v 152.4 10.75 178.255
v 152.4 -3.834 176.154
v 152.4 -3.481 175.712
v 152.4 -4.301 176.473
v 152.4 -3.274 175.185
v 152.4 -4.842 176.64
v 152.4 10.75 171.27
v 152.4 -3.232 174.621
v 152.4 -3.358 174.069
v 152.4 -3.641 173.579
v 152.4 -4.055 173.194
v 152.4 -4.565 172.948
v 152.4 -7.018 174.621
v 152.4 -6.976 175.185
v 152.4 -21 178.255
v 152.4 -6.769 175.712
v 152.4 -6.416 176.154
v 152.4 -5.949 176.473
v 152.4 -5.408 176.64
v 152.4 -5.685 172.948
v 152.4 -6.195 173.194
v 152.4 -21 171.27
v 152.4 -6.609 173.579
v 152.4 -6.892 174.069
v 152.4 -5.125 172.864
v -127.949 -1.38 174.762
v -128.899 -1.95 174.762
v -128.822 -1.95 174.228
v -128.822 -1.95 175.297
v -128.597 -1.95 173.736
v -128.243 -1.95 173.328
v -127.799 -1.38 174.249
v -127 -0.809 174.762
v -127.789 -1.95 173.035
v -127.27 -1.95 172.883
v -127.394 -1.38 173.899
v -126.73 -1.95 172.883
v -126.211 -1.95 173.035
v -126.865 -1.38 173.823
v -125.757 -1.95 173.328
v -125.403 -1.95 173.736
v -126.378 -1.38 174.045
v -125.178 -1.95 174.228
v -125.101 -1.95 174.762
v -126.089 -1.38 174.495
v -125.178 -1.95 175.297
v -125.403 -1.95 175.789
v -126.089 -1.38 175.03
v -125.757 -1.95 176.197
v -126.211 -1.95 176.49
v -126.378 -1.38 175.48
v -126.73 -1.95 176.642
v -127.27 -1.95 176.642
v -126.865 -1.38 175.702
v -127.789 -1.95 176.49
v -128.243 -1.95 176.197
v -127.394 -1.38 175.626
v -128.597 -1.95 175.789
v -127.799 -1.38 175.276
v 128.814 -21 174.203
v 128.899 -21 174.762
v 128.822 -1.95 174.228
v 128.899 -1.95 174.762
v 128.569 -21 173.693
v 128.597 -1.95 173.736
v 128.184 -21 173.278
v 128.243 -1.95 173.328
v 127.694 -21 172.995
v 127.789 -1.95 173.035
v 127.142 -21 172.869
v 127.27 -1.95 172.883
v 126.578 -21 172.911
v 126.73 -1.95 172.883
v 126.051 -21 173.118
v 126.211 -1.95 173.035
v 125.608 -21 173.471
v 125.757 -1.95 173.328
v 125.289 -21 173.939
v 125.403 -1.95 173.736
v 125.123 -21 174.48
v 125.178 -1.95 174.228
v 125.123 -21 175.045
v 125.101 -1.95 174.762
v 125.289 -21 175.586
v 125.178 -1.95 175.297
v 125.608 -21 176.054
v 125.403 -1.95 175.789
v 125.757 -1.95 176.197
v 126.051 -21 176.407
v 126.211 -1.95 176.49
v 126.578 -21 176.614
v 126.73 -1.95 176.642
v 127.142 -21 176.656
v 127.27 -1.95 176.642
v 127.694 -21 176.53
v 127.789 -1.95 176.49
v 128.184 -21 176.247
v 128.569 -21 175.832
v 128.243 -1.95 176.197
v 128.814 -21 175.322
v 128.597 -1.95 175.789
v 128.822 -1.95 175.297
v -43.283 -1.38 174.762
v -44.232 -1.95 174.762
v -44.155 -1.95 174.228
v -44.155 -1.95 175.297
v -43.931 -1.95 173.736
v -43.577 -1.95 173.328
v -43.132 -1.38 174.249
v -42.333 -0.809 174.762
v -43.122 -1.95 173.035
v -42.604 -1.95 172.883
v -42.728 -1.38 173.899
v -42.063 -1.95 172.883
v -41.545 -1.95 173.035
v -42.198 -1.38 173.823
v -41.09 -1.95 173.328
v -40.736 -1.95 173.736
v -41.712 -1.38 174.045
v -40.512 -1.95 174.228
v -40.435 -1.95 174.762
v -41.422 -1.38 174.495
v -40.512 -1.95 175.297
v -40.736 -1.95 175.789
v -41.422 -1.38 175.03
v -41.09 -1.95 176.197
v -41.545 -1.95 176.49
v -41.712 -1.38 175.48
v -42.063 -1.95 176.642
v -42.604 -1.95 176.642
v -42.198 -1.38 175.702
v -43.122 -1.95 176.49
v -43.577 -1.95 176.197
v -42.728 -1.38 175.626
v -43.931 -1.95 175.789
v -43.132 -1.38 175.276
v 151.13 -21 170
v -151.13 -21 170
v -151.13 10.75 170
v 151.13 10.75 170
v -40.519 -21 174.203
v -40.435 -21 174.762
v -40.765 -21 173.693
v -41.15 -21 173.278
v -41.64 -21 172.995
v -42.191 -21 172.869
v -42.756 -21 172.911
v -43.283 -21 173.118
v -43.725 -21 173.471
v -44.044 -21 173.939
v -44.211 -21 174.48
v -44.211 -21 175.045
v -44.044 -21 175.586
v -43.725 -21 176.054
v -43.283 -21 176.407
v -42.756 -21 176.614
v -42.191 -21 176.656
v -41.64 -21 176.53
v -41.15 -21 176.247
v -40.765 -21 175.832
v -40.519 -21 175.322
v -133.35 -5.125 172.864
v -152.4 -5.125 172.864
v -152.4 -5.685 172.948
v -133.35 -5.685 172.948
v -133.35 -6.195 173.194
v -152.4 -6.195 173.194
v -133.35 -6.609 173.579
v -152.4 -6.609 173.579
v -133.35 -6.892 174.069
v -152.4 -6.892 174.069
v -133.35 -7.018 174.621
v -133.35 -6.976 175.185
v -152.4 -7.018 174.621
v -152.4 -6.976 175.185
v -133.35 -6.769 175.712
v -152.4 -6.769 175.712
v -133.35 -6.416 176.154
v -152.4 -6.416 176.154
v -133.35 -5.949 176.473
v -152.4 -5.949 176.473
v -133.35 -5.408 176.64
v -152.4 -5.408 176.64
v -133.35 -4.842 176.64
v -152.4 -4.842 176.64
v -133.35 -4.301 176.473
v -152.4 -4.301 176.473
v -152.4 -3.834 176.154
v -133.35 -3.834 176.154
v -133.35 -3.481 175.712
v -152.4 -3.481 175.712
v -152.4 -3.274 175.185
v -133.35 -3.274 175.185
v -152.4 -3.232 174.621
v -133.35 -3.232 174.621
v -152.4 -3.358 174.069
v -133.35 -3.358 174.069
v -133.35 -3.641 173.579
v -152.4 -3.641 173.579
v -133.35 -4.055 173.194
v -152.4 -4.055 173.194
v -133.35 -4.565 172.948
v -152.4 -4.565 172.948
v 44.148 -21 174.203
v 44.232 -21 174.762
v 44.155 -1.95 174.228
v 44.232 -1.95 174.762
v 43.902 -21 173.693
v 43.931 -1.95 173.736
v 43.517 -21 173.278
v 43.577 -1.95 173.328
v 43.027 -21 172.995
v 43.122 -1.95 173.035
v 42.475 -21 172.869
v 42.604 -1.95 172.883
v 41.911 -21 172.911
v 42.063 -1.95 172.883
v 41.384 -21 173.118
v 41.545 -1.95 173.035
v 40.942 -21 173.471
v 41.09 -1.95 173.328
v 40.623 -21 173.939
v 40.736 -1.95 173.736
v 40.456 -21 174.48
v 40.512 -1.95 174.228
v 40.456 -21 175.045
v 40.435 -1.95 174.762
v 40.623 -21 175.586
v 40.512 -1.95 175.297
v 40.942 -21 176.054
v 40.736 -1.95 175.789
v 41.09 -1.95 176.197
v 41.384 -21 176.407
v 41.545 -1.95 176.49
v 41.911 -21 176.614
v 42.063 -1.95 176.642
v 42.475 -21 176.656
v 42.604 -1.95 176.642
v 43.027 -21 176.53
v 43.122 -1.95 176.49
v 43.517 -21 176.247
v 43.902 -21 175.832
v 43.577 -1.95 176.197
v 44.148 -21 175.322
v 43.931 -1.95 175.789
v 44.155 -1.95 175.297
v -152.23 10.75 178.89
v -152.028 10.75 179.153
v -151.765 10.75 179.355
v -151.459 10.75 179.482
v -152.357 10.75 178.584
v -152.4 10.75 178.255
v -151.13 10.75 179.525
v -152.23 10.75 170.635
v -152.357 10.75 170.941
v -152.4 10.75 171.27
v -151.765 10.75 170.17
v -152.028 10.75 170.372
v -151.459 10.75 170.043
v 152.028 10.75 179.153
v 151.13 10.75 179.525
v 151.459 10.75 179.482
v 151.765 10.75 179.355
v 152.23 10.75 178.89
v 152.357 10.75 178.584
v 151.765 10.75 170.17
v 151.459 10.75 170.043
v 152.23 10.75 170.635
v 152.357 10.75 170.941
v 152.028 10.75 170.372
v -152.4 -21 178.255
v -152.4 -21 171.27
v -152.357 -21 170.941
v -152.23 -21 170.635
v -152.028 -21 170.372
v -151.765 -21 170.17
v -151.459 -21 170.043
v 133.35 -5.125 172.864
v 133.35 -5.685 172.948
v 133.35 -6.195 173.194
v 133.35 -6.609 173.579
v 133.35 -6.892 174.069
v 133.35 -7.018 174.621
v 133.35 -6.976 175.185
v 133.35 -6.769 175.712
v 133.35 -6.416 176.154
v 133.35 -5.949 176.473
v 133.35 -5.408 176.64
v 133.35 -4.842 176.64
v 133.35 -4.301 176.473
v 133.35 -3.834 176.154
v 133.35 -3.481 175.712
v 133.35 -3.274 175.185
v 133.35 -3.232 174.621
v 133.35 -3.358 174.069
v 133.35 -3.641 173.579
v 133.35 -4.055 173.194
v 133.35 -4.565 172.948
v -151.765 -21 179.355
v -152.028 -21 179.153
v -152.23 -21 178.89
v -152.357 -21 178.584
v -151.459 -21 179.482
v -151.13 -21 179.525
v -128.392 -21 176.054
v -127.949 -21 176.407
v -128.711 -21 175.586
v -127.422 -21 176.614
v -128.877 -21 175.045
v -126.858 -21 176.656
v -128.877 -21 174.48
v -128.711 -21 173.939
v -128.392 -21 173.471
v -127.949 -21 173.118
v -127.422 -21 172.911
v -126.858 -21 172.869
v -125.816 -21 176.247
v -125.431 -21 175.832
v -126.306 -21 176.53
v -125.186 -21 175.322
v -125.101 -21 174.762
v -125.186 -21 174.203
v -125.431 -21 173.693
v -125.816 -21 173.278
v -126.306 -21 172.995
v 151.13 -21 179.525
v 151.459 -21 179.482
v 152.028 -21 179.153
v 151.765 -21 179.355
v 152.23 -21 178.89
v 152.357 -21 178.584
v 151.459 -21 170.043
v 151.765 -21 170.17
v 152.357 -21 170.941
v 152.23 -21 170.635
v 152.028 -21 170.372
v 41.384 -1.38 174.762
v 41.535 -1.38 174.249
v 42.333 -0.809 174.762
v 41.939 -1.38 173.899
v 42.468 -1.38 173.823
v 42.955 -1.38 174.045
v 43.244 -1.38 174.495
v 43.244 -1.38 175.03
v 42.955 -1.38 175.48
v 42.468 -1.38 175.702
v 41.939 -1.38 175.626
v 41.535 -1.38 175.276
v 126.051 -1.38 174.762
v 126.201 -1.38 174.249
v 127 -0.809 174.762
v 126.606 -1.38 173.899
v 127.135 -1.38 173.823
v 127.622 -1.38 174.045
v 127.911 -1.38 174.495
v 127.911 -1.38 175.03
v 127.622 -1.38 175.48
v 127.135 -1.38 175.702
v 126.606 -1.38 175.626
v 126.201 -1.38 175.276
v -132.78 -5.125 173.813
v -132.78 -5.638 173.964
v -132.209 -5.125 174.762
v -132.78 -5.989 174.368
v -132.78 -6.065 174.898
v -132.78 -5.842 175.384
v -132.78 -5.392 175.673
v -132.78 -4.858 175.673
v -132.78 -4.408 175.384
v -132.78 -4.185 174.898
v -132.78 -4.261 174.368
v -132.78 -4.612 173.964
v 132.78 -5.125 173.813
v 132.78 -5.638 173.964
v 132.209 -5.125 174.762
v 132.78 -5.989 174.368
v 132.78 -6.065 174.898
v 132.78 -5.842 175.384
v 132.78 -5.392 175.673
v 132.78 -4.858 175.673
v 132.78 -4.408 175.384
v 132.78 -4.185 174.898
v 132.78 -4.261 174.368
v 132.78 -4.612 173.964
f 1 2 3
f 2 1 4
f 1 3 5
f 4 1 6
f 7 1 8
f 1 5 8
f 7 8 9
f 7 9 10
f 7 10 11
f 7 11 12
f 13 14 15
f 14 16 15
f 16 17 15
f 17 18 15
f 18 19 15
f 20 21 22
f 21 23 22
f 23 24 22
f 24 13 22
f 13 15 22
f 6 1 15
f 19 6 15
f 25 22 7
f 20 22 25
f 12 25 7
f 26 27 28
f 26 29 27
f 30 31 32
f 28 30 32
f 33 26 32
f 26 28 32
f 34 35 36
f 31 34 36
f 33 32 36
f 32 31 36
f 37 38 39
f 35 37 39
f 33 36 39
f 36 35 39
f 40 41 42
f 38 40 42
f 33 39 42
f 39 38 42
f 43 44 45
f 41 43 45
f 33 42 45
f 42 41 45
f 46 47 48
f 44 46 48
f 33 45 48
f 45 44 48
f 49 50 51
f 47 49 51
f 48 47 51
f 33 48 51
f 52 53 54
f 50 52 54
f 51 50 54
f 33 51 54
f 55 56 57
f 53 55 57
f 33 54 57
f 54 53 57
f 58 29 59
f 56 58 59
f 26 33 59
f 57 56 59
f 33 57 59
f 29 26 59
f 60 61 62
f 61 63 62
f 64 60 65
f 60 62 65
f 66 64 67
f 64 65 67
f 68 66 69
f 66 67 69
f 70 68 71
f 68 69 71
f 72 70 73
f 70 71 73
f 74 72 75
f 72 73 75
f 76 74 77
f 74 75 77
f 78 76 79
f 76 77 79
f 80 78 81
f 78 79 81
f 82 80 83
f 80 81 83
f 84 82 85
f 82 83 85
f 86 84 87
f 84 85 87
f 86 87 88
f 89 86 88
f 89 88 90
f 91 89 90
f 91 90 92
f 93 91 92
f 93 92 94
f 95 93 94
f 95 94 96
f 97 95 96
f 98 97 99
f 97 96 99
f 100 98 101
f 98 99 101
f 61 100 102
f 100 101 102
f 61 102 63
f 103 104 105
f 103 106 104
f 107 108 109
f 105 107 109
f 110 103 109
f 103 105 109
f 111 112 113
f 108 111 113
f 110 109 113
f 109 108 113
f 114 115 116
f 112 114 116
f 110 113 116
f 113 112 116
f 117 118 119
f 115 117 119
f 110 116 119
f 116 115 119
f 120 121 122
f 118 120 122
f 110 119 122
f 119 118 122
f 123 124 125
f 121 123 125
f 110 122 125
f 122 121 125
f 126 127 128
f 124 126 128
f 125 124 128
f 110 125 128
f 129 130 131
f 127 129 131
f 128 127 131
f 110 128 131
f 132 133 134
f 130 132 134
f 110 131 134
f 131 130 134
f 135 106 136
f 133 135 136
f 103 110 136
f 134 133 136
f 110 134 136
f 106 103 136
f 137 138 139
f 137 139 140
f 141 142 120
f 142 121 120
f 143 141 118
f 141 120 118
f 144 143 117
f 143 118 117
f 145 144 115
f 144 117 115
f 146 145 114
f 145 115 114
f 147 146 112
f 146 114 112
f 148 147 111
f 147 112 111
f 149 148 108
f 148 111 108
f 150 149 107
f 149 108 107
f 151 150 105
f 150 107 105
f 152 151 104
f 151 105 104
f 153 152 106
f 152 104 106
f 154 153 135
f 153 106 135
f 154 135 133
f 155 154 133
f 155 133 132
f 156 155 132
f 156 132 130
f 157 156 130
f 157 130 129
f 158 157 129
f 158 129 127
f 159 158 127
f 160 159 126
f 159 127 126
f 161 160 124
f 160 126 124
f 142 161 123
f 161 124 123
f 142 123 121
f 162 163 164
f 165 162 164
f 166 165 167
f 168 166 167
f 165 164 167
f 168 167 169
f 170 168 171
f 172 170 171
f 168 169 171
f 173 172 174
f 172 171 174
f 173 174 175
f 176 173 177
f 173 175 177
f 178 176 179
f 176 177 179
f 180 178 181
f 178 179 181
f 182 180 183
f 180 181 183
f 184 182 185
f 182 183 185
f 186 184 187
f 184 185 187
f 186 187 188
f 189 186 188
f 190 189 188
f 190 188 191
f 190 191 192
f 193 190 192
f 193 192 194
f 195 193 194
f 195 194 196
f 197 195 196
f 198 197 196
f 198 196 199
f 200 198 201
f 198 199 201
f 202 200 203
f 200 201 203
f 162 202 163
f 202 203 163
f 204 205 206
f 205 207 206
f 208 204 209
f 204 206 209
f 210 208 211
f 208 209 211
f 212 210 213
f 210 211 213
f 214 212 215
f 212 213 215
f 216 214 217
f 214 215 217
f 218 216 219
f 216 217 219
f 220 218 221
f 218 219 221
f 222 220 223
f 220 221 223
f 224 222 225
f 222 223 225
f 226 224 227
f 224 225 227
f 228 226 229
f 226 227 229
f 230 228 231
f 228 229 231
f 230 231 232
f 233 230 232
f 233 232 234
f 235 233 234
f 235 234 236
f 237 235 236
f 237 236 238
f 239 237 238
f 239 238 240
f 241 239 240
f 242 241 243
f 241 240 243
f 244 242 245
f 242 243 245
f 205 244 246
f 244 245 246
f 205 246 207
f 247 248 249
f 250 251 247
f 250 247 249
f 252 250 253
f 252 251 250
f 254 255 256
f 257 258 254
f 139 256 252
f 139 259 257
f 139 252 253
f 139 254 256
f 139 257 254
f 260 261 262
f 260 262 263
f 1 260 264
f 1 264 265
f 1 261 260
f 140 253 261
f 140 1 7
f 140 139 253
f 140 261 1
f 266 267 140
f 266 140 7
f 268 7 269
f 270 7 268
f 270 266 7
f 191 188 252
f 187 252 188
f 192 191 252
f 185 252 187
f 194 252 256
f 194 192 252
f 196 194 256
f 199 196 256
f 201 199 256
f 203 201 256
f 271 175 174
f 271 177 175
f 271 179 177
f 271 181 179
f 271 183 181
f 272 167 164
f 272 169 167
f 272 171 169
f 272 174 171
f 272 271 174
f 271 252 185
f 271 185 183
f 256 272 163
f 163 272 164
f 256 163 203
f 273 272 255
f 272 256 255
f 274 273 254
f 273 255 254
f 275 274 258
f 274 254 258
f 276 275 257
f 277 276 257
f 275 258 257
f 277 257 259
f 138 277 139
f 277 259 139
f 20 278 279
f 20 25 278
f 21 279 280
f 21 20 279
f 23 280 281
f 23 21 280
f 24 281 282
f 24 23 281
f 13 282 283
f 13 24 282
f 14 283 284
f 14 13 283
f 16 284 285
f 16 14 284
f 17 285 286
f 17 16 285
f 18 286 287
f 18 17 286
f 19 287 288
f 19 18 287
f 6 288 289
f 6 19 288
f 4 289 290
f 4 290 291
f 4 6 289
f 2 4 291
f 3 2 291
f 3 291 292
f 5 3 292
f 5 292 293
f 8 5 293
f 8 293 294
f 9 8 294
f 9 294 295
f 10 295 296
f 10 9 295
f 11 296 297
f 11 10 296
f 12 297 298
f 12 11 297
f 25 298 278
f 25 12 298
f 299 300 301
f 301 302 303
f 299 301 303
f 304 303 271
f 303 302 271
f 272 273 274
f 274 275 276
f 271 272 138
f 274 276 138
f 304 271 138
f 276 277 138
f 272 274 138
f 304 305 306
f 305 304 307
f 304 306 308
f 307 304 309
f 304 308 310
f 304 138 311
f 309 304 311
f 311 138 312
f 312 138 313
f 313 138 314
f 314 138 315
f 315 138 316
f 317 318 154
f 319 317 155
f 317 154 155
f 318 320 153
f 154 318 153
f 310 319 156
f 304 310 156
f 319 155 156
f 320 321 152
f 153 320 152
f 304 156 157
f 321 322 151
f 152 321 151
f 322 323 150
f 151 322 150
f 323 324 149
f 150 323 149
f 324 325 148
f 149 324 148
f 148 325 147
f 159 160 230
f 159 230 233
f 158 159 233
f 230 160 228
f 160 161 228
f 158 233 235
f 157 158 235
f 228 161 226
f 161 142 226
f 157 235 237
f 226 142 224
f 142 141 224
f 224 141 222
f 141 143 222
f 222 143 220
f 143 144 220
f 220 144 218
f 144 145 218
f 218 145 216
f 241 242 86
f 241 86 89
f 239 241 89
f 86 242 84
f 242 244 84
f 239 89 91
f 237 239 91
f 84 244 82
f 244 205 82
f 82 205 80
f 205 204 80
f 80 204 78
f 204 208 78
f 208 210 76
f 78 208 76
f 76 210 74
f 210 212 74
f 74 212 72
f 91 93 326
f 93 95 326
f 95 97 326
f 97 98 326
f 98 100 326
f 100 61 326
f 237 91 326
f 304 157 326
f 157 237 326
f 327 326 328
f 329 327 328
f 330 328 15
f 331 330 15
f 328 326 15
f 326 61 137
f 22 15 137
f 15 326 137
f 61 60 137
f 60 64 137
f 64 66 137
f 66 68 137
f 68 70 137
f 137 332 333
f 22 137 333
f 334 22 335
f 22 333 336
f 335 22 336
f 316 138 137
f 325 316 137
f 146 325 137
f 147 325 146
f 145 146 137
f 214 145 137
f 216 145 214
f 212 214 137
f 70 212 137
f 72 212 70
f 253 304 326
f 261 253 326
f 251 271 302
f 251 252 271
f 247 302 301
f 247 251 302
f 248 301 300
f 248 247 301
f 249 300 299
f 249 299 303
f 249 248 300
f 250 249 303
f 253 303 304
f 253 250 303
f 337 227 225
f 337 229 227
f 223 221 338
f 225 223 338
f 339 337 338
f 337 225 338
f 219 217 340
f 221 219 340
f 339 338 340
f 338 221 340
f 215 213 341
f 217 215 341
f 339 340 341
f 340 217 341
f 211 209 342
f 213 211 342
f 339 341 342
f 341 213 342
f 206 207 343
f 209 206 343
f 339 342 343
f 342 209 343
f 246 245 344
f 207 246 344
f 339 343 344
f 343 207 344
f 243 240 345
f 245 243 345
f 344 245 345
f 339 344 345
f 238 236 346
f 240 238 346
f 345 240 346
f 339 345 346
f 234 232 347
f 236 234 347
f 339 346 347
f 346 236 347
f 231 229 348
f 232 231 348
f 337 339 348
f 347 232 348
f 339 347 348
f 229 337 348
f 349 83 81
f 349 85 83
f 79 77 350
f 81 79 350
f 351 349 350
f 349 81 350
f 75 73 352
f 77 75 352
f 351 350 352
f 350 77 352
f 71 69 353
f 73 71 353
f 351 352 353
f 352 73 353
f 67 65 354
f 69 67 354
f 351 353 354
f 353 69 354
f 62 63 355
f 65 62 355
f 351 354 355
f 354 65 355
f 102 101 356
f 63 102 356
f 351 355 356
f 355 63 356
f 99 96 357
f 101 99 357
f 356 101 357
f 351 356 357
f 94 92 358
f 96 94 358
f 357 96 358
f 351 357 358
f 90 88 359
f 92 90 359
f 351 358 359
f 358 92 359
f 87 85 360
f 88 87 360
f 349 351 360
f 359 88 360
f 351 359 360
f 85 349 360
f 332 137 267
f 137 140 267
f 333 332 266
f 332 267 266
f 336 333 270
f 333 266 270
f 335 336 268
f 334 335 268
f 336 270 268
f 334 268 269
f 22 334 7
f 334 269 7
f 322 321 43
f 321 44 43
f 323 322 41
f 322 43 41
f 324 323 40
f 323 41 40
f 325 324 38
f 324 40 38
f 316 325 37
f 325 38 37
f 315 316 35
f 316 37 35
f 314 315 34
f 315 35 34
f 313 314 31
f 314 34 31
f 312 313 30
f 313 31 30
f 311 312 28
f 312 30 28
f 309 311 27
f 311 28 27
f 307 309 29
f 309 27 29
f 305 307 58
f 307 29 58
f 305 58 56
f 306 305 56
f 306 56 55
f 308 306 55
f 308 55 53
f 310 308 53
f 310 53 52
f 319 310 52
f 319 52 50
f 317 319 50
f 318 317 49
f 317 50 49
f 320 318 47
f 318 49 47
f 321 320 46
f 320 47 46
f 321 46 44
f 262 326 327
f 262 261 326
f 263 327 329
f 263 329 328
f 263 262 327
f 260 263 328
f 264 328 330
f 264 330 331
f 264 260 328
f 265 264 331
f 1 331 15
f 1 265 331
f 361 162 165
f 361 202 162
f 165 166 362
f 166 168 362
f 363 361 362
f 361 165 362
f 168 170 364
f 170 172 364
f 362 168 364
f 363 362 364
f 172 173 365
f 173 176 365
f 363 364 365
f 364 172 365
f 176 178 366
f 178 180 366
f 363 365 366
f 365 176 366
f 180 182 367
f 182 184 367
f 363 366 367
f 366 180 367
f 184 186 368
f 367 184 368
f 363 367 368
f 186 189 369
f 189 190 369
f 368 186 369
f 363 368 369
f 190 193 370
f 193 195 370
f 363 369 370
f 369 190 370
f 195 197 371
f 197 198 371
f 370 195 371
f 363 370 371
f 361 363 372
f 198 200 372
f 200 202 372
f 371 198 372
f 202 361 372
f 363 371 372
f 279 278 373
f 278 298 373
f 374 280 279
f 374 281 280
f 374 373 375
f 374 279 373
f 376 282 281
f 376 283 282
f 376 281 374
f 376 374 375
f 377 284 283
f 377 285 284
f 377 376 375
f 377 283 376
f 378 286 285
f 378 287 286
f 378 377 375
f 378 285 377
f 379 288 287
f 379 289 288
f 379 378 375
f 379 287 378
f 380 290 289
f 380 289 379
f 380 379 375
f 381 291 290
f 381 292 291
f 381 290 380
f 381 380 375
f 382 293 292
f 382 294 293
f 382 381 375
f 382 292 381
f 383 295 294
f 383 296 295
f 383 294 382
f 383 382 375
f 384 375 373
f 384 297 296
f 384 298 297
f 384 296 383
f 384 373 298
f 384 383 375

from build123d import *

# Parameters (mm, degrees)
SKETCH1_W                  = 304.8
SKETCH1_H                  = 9.525
BOSS_EXTRUDE1_DEPTH        = 31.75
F_10_24_TAPPED_HOLE1_D     = 3.7973
F_10_24_TAPPED_HOLE1_DEPTH = 19.05
F_10_24_TAPPED_HOLE1_TIP   = 1.140824014
FILLET1_R                  = 1.27


with BuildPart() as part:
    # Sketch1 → Boss-Extrude1 (new body)
    with BuildSketch(Plane(origin=(0, -21, 0), x_dir=(1, 0, 0), z_dir=(0, 1, 0))):
        with Locations((6.69e-07, -174.7625)):
            Rectangle(SKETCH1_W, SKETCH1_H)
    extrude(amount=BOSS_EXTRUDE1_DEPTH)

    # #10-24 Tapped Hole1
    with Locations(Plane(origin=(0, -21, 0), x_dir=(-1, 0, 0), z_dir=(0, -1, 0))):
        with Locations((-127.000000669, -174.7625), (-42.333334002, -174.7625), (126.999999331, -174.7625), (42.333332664, -174.7625)):
            Hole(F_10_24_TAPPED_HOLE1_D / 2, depth=F_10_24_TAPPED_HOLE1_DEPTH)
            with Locations((0, 0, -(F_10_24_TAPPED_HOLE1_DEPTH + F_10_24_TAPPED_HOLE1_TIP / 2))):  # 118° drill point
                Cone(0, F_10_24_TAPPED_HOLE1_D / 2, F_10_24_TAPPED_HOLE1_TIP, mode=Mode.SUBTRACT)

    # Sketch5 → #10-24 Tapped Hole2 (revolve, cut)
    with BuildSketch(Plane(origin=(152.400000669, -5.125, 174.7625), x_dir=(0, 0, -1), z_dir=(0, 1, 0))):
        Polygon((0, 0), (0, 20.190824014), (1.89865, 19.05), (1.89865, 0), align=None)
    f_10_24_tapped_hole2 = revolve(axis=Axis((158.750000669, -5.125, 174.7625), (-1, 0, 0)), mode=Mode.SUBTRACT)

    # Mirror1: #10-24 Tapped Hole2 across plane
    add(f_10_24_tapped_hole2.mirror(Plane(origin=(0, 0, 0), x_dir=(0, 0, 1), z_dir=(1, 0, 0))), mode=Mode.SUBTRACT)

    # Fillet1
    fillet1_edges = [part.edges().sort_by_distance(p)[0] for p in [
        (152.400000669, -5.125, 170),
        (152.400000669, -5.125, 179.525),
        (-152.399999331, -5.125, 179.525),
        (-152.399999331, -5.125, 170),
    ]]
    fillet(fillet1_edges, radius=FILLET1_R)


solid = part.part
